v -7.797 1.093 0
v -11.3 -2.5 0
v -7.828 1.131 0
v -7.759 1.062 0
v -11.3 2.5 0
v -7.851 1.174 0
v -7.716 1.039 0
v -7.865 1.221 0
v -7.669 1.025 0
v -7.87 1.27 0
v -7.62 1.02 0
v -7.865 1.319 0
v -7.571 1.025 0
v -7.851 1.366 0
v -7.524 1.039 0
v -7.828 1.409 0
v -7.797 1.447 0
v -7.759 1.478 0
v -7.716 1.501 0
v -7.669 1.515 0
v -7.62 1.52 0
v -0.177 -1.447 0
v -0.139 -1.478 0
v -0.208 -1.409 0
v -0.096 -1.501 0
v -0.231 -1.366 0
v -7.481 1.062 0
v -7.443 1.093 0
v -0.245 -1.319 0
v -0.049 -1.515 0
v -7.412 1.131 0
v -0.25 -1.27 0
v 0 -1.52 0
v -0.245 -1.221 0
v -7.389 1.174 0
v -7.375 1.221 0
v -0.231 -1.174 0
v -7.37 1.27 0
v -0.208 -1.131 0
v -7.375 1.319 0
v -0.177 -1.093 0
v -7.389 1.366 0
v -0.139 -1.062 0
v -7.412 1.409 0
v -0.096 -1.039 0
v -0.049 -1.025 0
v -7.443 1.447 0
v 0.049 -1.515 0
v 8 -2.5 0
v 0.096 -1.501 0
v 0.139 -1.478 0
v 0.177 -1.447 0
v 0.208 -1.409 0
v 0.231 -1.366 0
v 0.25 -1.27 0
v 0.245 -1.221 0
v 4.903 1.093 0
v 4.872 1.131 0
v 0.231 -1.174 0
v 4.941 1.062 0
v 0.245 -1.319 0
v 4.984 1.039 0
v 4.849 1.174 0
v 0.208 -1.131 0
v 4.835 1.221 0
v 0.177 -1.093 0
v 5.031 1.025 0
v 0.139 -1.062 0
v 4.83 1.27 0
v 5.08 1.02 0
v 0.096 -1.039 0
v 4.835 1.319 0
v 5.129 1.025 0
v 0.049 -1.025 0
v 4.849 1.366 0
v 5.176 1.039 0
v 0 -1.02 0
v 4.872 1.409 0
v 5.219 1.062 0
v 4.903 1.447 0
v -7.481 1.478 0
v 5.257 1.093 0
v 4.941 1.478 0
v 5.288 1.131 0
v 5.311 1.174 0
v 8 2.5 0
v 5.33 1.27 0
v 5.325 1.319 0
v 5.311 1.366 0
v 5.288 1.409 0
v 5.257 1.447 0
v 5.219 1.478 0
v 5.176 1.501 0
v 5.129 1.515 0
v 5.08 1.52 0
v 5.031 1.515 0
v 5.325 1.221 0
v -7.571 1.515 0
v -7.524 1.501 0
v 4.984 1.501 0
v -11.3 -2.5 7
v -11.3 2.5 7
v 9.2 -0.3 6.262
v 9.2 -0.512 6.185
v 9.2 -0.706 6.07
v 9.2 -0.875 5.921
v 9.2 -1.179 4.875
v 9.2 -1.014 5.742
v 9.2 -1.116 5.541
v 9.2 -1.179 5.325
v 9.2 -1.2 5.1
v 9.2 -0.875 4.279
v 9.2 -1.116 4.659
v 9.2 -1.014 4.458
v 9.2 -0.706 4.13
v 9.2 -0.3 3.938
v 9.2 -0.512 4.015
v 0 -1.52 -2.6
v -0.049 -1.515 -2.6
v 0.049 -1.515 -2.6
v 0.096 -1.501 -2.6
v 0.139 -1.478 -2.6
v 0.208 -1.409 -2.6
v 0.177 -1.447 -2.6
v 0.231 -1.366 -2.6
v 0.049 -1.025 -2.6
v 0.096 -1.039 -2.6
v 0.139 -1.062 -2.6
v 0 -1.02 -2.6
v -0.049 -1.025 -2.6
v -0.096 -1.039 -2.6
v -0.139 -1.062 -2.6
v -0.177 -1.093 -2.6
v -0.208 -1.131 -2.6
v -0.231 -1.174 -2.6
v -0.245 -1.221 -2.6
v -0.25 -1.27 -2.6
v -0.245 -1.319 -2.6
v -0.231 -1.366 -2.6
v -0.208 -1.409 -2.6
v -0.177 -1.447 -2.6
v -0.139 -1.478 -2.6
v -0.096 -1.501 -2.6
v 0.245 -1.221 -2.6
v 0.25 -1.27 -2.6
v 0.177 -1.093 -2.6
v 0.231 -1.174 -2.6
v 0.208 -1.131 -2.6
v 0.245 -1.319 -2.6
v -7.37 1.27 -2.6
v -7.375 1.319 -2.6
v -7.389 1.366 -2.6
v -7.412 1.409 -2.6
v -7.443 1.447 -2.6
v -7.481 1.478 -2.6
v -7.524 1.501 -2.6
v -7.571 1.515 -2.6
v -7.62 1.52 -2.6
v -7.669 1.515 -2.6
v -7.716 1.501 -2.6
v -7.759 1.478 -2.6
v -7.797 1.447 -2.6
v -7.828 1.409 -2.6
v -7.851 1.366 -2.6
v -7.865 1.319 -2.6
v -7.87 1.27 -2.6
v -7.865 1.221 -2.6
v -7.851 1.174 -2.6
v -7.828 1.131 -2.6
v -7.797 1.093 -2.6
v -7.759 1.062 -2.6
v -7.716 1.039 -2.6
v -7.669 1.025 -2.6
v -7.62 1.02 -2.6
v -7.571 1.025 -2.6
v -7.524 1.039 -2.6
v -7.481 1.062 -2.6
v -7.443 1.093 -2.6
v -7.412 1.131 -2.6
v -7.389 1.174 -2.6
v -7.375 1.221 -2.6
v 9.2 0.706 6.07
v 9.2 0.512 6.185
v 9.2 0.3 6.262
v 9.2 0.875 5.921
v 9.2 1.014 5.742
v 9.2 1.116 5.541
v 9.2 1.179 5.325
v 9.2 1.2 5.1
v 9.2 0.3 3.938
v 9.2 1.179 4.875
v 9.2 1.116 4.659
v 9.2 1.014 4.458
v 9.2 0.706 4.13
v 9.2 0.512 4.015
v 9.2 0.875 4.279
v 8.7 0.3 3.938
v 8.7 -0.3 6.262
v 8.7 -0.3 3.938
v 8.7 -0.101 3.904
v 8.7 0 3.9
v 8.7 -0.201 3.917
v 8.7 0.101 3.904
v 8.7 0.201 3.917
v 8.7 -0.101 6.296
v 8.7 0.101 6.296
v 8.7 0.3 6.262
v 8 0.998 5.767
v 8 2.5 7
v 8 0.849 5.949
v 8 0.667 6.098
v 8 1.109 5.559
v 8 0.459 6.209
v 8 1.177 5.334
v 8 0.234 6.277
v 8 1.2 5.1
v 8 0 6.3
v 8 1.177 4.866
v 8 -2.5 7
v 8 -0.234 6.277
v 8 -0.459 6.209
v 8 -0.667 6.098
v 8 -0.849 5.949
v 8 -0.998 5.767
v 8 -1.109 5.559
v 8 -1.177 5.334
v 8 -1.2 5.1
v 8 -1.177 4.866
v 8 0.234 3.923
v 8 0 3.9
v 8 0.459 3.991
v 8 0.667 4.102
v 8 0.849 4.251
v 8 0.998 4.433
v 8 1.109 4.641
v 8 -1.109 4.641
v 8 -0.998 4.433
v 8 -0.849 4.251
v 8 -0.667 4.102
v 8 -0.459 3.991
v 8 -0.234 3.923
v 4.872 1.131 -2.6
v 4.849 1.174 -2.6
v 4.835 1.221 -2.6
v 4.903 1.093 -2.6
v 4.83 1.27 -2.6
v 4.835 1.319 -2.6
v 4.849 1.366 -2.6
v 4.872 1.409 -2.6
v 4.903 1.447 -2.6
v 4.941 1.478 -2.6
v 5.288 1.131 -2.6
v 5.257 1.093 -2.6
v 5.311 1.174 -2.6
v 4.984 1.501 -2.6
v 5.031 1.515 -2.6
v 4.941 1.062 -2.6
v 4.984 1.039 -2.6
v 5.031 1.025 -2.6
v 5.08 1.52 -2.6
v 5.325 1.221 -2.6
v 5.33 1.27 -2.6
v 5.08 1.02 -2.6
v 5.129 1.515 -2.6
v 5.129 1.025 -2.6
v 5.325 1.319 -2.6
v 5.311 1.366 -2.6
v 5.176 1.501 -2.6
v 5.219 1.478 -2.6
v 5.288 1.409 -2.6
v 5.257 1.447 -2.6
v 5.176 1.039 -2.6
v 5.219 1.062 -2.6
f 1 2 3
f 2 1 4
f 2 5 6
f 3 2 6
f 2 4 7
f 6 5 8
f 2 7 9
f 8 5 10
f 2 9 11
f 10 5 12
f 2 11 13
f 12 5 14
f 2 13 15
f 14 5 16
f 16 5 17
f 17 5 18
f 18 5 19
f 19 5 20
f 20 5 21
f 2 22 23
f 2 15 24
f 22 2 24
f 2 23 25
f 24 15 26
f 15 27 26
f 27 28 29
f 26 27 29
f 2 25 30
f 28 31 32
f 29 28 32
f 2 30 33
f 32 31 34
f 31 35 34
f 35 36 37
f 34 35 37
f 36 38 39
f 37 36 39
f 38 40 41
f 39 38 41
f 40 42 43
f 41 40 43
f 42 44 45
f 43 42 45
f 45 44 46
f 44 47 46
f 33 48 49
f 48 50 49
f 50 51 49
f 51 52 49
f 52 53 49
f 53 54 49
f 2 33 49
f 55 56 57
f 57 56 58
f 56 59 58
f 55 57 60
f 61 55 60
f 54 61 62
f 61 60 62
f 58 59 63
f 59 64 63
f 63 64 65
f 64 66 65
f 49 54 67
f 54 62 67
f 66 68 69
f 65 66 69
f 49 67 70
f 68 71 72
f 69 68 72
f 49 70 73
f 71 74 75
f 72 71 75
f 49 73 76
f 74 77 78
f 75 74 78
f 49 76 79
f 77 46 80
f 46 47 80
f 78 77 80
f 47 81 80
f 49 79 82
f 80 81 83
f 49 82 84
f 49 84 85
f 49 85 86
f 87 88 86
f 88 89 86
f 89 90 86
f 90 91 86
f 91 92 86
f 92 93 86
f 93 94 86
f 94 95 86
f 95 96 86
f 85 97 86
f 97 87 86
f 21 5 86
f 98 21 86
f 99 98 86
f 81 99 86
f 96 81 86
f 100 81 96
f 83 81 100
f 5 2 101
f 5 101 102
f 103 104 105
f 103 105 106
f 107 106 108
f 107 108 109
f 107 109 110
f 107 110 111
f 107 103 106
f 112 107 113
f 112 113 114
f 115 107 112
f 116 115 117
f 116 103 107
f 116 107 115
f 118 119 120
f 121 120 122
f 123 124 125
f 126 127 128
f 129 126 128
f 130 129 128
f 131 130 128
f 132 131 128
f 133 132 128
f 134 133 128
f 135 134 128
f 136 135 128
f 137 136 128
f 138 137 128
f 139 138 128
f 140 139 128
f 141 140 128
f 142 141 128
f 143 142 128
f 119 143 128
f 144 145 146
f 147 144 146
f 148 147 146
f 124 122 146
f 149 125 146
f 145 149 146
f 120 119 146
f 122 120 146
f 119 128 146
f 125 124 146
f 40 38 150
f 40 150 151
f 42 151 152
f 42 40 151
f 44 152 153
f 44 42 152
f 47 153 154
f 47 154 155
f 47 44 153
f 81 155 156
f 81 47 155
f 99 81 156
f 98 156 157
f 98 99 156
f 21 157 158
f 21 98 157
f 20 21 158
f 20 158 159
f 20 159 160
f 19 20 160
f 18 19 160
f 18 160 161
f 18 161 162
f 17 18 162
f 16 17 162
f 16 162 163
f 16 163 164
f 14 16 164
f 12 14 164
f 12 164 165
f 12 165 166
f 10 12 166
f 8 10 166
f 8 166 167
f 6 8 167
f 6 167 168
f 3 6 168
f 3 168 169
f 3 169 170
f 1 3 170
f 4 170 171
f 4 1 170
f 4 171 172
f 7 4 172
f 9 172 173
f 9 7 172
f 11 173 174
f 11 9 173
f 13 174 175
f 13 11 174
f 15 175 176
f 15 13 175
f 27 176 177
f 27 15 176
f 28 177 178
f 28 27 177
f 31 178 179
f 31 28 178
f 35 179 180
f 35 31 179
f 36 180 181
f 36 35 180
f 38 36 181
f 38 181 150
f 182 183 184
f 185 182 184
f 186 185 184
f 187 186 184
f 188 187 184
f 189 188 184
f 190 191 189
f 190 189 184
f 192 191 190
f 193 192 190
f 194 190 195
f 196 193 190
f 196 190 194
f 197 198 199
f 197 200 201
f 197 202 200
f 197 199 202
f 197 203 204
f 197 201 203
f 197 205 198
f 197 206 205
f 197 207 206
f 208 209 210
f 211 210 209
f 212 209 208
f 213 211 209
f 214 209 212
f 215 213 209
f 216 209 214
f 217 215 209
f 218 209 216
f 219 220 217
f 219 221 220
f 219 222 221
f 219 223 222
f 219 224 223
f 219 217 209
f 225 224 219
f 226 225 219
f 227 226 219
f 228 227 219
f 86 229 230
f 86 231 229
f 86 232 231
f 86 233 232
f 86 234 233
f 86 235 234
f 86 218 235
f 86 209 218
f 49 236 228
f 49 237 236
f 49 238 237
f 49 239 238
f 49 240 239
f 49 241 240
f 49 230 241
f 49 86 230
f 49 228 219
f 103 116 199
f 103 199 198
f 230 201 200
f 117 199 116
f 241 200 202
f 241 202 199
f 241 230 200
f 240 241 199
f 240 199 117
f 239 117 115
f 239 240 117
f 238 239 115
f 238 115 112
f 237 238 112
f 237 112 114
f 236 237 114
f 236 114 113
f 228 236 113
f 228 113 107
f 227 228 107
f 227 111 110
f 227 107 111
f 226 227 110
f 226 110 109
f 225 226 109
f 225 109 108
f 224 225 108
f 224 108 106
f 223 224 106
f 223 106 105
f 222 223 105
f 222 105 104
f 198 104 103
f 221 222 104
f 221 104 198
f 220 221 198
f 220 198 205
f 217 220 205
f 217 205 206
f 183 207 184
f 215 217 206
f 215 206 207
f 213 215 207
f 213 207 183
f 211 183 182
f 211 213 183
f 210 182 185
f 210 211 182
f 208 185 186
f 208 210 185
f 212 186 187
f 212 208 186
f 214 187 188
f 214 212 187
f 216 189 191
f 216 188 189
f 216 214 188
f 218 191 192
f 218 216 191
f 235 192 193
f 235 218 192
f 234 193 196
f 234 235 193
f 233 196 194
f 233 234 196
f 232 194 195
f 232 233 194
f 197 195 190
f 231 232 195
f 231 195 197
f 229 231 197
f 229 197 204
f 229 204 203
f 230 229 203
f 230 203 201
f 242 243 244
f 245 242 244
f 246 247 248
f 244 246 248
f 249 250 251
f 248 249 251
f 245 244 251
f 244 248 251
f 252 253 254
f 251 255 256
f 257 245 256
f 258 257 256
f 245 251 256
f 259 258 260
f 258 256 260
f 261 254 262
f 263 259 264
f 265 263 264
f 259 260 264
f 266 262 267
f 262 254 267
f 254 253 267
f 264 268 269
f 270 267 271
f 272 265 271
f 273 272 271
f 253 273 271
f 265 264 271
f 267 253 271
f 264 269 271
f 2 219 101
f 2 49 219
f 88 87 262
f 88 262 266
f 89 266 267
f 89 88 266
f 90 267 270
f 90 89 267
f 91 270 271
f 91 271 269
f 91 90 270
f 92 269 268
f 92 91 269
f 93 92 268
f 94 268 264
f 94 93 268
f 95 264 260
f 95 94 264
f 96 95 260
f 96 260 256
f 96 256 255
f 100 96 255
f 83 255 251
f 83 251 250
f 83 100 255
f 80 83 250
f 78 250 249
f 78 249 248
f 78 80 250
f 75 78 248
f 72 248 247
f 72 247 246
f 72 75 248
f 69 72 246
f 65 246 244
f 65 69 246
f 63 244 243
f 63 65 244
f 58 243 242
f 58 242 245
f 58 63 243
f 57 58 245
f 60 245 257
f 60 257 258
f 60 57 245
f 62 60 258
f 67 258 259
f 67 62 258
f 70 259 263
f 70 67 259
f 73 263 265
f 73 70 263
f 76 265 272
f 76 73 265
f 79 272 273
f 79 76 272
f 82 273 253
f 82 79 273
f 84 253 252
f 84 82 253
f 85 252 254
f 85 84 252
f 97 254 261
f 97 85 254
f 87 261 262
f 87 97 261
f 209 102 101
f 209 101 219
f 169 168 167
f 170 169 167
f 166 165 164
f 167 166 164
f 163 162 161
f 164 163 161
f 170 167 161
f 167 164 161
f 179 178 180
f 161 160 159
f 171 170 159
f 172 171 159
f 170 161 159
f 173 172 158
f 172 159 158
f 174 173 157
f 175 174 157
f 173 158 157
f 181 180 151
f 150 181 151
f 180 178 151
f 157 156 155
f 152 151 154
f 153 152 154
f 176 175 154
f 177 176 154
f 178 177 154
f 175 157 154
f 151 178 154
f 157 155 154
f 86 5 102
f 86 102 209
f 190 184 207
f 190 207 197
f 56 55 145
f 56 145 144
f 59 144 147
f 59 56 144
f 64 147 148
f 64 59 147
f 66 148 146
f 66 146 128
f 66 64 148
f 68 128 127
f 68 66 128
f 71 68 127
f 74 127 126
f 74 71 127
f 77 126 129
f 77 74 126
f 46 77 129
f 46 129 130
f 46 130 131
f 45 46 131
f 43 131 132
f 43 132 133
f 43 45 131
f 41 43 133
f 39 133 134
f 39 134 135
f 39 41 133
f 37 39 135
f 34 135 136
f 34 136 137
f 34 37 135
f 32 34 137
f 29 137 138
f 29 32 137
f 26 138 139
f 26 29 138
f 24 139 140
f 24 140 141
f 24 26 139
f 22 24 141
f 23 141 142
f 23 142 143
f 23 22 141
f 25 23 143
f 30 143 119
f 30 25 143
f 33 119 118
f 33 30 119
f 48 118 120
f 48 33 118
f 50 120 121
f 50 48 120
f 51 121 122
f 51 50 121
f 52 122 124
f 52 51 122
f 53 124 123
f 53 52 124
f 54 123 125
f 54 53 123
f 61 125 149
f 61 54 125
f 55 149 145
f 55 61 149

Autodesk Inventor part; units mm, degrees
ref_plane "YZ Plane" through (0, 0, 0) normal (1, 0, 0) x (0, 1, 0)
ref_plane "XZ Plane" through (0, 0, 0) normal (0, 1, 0) x (-1, 0, 0)
ref_plane "XY Plane" through (0, 0, 0) normal (0, 0, 1) x (1, 0, 0)
sketch "Boceto39" plane through (0, 0, 0) normal (0, 0, 1) x (1, 0, 0)
  circle A0 centre (0, -1.27) radius 0.25
  circle A1 centre (5.08, 1.27) radius 0.25
  circle A2 centre (-7.62, 1.27) radius 0.25
  point P0 (0, 0)
  dimension "d373" = 0.5
  dimension "d376" = 12.7
  dimension "d377" = 5.08
  dimension "d392" = 1.27
  dimension "d393" = 2.54
extrude "Extrusión13" add sketch "Boceto39" against normal blind 2.6
sketch "Boceto40" plane through (0, 0, 0) normal (0, 0, 1) x (1, 0, 0)
  line L0 (-11.3, 2.5) -> (8, 2.5)
  line L1 (8, 2.5) -> (8, -2.5)
  line L2 (8, -2.5) -> (-11.3, -2.5)
  line L3 (-11.3, -2.5) -> (-11.3, 2.5)
  point P0 (0, 0)
  point P1 (8, 0)
  dimension "d380" = 5
  dimension "d381" = 19.3
  dimension "d382" = 8
extrude "Extrusión14" add sketch "Boceto40" along normal blind 7
sketch "Boceto41" plane through (8, -2.5, 0) normal (1, 0, 0) x (0, 0, -1)
  circle A0 centre (-5.1, 2.5) radius 1.2
  line L0 (-7, 0) -> (-7, 5) projected
  line L1 (0, 5) -> (0, 0) projected
  point P0 (0, 2.5)
  point P1 (0, 2.5)
  dimension "d385" = 2.4
  dimension "d386" = 1.9
extrude "Extrusión15" add sketch "Boceto41" along normal blind 1.2
sketch "Boceto42" plane through (9.2, 0, 5.1) normal (1, 0, 0) x (0, 0, -1)
  line L0 (-1.4485, 0.3) -> (1.5656, 0.3)
  line L1 (1.5656, 0.3) -> (1.5656, -0.3)
  line L2 (1.5656, -0.3) -> (-1.4485, -0.3)
  line L3 (-1.4485, -0.3) -> (-1.4485, 0.3)
  point P0 (5.1, 0)
  point P1 (1.5656, 0)
  dimension "d389" = 0.6
extrude "Extrusión16" cut sketch "Boceto42" against normal blind 0.5
properties part number "RES-PRESET-3006P"
